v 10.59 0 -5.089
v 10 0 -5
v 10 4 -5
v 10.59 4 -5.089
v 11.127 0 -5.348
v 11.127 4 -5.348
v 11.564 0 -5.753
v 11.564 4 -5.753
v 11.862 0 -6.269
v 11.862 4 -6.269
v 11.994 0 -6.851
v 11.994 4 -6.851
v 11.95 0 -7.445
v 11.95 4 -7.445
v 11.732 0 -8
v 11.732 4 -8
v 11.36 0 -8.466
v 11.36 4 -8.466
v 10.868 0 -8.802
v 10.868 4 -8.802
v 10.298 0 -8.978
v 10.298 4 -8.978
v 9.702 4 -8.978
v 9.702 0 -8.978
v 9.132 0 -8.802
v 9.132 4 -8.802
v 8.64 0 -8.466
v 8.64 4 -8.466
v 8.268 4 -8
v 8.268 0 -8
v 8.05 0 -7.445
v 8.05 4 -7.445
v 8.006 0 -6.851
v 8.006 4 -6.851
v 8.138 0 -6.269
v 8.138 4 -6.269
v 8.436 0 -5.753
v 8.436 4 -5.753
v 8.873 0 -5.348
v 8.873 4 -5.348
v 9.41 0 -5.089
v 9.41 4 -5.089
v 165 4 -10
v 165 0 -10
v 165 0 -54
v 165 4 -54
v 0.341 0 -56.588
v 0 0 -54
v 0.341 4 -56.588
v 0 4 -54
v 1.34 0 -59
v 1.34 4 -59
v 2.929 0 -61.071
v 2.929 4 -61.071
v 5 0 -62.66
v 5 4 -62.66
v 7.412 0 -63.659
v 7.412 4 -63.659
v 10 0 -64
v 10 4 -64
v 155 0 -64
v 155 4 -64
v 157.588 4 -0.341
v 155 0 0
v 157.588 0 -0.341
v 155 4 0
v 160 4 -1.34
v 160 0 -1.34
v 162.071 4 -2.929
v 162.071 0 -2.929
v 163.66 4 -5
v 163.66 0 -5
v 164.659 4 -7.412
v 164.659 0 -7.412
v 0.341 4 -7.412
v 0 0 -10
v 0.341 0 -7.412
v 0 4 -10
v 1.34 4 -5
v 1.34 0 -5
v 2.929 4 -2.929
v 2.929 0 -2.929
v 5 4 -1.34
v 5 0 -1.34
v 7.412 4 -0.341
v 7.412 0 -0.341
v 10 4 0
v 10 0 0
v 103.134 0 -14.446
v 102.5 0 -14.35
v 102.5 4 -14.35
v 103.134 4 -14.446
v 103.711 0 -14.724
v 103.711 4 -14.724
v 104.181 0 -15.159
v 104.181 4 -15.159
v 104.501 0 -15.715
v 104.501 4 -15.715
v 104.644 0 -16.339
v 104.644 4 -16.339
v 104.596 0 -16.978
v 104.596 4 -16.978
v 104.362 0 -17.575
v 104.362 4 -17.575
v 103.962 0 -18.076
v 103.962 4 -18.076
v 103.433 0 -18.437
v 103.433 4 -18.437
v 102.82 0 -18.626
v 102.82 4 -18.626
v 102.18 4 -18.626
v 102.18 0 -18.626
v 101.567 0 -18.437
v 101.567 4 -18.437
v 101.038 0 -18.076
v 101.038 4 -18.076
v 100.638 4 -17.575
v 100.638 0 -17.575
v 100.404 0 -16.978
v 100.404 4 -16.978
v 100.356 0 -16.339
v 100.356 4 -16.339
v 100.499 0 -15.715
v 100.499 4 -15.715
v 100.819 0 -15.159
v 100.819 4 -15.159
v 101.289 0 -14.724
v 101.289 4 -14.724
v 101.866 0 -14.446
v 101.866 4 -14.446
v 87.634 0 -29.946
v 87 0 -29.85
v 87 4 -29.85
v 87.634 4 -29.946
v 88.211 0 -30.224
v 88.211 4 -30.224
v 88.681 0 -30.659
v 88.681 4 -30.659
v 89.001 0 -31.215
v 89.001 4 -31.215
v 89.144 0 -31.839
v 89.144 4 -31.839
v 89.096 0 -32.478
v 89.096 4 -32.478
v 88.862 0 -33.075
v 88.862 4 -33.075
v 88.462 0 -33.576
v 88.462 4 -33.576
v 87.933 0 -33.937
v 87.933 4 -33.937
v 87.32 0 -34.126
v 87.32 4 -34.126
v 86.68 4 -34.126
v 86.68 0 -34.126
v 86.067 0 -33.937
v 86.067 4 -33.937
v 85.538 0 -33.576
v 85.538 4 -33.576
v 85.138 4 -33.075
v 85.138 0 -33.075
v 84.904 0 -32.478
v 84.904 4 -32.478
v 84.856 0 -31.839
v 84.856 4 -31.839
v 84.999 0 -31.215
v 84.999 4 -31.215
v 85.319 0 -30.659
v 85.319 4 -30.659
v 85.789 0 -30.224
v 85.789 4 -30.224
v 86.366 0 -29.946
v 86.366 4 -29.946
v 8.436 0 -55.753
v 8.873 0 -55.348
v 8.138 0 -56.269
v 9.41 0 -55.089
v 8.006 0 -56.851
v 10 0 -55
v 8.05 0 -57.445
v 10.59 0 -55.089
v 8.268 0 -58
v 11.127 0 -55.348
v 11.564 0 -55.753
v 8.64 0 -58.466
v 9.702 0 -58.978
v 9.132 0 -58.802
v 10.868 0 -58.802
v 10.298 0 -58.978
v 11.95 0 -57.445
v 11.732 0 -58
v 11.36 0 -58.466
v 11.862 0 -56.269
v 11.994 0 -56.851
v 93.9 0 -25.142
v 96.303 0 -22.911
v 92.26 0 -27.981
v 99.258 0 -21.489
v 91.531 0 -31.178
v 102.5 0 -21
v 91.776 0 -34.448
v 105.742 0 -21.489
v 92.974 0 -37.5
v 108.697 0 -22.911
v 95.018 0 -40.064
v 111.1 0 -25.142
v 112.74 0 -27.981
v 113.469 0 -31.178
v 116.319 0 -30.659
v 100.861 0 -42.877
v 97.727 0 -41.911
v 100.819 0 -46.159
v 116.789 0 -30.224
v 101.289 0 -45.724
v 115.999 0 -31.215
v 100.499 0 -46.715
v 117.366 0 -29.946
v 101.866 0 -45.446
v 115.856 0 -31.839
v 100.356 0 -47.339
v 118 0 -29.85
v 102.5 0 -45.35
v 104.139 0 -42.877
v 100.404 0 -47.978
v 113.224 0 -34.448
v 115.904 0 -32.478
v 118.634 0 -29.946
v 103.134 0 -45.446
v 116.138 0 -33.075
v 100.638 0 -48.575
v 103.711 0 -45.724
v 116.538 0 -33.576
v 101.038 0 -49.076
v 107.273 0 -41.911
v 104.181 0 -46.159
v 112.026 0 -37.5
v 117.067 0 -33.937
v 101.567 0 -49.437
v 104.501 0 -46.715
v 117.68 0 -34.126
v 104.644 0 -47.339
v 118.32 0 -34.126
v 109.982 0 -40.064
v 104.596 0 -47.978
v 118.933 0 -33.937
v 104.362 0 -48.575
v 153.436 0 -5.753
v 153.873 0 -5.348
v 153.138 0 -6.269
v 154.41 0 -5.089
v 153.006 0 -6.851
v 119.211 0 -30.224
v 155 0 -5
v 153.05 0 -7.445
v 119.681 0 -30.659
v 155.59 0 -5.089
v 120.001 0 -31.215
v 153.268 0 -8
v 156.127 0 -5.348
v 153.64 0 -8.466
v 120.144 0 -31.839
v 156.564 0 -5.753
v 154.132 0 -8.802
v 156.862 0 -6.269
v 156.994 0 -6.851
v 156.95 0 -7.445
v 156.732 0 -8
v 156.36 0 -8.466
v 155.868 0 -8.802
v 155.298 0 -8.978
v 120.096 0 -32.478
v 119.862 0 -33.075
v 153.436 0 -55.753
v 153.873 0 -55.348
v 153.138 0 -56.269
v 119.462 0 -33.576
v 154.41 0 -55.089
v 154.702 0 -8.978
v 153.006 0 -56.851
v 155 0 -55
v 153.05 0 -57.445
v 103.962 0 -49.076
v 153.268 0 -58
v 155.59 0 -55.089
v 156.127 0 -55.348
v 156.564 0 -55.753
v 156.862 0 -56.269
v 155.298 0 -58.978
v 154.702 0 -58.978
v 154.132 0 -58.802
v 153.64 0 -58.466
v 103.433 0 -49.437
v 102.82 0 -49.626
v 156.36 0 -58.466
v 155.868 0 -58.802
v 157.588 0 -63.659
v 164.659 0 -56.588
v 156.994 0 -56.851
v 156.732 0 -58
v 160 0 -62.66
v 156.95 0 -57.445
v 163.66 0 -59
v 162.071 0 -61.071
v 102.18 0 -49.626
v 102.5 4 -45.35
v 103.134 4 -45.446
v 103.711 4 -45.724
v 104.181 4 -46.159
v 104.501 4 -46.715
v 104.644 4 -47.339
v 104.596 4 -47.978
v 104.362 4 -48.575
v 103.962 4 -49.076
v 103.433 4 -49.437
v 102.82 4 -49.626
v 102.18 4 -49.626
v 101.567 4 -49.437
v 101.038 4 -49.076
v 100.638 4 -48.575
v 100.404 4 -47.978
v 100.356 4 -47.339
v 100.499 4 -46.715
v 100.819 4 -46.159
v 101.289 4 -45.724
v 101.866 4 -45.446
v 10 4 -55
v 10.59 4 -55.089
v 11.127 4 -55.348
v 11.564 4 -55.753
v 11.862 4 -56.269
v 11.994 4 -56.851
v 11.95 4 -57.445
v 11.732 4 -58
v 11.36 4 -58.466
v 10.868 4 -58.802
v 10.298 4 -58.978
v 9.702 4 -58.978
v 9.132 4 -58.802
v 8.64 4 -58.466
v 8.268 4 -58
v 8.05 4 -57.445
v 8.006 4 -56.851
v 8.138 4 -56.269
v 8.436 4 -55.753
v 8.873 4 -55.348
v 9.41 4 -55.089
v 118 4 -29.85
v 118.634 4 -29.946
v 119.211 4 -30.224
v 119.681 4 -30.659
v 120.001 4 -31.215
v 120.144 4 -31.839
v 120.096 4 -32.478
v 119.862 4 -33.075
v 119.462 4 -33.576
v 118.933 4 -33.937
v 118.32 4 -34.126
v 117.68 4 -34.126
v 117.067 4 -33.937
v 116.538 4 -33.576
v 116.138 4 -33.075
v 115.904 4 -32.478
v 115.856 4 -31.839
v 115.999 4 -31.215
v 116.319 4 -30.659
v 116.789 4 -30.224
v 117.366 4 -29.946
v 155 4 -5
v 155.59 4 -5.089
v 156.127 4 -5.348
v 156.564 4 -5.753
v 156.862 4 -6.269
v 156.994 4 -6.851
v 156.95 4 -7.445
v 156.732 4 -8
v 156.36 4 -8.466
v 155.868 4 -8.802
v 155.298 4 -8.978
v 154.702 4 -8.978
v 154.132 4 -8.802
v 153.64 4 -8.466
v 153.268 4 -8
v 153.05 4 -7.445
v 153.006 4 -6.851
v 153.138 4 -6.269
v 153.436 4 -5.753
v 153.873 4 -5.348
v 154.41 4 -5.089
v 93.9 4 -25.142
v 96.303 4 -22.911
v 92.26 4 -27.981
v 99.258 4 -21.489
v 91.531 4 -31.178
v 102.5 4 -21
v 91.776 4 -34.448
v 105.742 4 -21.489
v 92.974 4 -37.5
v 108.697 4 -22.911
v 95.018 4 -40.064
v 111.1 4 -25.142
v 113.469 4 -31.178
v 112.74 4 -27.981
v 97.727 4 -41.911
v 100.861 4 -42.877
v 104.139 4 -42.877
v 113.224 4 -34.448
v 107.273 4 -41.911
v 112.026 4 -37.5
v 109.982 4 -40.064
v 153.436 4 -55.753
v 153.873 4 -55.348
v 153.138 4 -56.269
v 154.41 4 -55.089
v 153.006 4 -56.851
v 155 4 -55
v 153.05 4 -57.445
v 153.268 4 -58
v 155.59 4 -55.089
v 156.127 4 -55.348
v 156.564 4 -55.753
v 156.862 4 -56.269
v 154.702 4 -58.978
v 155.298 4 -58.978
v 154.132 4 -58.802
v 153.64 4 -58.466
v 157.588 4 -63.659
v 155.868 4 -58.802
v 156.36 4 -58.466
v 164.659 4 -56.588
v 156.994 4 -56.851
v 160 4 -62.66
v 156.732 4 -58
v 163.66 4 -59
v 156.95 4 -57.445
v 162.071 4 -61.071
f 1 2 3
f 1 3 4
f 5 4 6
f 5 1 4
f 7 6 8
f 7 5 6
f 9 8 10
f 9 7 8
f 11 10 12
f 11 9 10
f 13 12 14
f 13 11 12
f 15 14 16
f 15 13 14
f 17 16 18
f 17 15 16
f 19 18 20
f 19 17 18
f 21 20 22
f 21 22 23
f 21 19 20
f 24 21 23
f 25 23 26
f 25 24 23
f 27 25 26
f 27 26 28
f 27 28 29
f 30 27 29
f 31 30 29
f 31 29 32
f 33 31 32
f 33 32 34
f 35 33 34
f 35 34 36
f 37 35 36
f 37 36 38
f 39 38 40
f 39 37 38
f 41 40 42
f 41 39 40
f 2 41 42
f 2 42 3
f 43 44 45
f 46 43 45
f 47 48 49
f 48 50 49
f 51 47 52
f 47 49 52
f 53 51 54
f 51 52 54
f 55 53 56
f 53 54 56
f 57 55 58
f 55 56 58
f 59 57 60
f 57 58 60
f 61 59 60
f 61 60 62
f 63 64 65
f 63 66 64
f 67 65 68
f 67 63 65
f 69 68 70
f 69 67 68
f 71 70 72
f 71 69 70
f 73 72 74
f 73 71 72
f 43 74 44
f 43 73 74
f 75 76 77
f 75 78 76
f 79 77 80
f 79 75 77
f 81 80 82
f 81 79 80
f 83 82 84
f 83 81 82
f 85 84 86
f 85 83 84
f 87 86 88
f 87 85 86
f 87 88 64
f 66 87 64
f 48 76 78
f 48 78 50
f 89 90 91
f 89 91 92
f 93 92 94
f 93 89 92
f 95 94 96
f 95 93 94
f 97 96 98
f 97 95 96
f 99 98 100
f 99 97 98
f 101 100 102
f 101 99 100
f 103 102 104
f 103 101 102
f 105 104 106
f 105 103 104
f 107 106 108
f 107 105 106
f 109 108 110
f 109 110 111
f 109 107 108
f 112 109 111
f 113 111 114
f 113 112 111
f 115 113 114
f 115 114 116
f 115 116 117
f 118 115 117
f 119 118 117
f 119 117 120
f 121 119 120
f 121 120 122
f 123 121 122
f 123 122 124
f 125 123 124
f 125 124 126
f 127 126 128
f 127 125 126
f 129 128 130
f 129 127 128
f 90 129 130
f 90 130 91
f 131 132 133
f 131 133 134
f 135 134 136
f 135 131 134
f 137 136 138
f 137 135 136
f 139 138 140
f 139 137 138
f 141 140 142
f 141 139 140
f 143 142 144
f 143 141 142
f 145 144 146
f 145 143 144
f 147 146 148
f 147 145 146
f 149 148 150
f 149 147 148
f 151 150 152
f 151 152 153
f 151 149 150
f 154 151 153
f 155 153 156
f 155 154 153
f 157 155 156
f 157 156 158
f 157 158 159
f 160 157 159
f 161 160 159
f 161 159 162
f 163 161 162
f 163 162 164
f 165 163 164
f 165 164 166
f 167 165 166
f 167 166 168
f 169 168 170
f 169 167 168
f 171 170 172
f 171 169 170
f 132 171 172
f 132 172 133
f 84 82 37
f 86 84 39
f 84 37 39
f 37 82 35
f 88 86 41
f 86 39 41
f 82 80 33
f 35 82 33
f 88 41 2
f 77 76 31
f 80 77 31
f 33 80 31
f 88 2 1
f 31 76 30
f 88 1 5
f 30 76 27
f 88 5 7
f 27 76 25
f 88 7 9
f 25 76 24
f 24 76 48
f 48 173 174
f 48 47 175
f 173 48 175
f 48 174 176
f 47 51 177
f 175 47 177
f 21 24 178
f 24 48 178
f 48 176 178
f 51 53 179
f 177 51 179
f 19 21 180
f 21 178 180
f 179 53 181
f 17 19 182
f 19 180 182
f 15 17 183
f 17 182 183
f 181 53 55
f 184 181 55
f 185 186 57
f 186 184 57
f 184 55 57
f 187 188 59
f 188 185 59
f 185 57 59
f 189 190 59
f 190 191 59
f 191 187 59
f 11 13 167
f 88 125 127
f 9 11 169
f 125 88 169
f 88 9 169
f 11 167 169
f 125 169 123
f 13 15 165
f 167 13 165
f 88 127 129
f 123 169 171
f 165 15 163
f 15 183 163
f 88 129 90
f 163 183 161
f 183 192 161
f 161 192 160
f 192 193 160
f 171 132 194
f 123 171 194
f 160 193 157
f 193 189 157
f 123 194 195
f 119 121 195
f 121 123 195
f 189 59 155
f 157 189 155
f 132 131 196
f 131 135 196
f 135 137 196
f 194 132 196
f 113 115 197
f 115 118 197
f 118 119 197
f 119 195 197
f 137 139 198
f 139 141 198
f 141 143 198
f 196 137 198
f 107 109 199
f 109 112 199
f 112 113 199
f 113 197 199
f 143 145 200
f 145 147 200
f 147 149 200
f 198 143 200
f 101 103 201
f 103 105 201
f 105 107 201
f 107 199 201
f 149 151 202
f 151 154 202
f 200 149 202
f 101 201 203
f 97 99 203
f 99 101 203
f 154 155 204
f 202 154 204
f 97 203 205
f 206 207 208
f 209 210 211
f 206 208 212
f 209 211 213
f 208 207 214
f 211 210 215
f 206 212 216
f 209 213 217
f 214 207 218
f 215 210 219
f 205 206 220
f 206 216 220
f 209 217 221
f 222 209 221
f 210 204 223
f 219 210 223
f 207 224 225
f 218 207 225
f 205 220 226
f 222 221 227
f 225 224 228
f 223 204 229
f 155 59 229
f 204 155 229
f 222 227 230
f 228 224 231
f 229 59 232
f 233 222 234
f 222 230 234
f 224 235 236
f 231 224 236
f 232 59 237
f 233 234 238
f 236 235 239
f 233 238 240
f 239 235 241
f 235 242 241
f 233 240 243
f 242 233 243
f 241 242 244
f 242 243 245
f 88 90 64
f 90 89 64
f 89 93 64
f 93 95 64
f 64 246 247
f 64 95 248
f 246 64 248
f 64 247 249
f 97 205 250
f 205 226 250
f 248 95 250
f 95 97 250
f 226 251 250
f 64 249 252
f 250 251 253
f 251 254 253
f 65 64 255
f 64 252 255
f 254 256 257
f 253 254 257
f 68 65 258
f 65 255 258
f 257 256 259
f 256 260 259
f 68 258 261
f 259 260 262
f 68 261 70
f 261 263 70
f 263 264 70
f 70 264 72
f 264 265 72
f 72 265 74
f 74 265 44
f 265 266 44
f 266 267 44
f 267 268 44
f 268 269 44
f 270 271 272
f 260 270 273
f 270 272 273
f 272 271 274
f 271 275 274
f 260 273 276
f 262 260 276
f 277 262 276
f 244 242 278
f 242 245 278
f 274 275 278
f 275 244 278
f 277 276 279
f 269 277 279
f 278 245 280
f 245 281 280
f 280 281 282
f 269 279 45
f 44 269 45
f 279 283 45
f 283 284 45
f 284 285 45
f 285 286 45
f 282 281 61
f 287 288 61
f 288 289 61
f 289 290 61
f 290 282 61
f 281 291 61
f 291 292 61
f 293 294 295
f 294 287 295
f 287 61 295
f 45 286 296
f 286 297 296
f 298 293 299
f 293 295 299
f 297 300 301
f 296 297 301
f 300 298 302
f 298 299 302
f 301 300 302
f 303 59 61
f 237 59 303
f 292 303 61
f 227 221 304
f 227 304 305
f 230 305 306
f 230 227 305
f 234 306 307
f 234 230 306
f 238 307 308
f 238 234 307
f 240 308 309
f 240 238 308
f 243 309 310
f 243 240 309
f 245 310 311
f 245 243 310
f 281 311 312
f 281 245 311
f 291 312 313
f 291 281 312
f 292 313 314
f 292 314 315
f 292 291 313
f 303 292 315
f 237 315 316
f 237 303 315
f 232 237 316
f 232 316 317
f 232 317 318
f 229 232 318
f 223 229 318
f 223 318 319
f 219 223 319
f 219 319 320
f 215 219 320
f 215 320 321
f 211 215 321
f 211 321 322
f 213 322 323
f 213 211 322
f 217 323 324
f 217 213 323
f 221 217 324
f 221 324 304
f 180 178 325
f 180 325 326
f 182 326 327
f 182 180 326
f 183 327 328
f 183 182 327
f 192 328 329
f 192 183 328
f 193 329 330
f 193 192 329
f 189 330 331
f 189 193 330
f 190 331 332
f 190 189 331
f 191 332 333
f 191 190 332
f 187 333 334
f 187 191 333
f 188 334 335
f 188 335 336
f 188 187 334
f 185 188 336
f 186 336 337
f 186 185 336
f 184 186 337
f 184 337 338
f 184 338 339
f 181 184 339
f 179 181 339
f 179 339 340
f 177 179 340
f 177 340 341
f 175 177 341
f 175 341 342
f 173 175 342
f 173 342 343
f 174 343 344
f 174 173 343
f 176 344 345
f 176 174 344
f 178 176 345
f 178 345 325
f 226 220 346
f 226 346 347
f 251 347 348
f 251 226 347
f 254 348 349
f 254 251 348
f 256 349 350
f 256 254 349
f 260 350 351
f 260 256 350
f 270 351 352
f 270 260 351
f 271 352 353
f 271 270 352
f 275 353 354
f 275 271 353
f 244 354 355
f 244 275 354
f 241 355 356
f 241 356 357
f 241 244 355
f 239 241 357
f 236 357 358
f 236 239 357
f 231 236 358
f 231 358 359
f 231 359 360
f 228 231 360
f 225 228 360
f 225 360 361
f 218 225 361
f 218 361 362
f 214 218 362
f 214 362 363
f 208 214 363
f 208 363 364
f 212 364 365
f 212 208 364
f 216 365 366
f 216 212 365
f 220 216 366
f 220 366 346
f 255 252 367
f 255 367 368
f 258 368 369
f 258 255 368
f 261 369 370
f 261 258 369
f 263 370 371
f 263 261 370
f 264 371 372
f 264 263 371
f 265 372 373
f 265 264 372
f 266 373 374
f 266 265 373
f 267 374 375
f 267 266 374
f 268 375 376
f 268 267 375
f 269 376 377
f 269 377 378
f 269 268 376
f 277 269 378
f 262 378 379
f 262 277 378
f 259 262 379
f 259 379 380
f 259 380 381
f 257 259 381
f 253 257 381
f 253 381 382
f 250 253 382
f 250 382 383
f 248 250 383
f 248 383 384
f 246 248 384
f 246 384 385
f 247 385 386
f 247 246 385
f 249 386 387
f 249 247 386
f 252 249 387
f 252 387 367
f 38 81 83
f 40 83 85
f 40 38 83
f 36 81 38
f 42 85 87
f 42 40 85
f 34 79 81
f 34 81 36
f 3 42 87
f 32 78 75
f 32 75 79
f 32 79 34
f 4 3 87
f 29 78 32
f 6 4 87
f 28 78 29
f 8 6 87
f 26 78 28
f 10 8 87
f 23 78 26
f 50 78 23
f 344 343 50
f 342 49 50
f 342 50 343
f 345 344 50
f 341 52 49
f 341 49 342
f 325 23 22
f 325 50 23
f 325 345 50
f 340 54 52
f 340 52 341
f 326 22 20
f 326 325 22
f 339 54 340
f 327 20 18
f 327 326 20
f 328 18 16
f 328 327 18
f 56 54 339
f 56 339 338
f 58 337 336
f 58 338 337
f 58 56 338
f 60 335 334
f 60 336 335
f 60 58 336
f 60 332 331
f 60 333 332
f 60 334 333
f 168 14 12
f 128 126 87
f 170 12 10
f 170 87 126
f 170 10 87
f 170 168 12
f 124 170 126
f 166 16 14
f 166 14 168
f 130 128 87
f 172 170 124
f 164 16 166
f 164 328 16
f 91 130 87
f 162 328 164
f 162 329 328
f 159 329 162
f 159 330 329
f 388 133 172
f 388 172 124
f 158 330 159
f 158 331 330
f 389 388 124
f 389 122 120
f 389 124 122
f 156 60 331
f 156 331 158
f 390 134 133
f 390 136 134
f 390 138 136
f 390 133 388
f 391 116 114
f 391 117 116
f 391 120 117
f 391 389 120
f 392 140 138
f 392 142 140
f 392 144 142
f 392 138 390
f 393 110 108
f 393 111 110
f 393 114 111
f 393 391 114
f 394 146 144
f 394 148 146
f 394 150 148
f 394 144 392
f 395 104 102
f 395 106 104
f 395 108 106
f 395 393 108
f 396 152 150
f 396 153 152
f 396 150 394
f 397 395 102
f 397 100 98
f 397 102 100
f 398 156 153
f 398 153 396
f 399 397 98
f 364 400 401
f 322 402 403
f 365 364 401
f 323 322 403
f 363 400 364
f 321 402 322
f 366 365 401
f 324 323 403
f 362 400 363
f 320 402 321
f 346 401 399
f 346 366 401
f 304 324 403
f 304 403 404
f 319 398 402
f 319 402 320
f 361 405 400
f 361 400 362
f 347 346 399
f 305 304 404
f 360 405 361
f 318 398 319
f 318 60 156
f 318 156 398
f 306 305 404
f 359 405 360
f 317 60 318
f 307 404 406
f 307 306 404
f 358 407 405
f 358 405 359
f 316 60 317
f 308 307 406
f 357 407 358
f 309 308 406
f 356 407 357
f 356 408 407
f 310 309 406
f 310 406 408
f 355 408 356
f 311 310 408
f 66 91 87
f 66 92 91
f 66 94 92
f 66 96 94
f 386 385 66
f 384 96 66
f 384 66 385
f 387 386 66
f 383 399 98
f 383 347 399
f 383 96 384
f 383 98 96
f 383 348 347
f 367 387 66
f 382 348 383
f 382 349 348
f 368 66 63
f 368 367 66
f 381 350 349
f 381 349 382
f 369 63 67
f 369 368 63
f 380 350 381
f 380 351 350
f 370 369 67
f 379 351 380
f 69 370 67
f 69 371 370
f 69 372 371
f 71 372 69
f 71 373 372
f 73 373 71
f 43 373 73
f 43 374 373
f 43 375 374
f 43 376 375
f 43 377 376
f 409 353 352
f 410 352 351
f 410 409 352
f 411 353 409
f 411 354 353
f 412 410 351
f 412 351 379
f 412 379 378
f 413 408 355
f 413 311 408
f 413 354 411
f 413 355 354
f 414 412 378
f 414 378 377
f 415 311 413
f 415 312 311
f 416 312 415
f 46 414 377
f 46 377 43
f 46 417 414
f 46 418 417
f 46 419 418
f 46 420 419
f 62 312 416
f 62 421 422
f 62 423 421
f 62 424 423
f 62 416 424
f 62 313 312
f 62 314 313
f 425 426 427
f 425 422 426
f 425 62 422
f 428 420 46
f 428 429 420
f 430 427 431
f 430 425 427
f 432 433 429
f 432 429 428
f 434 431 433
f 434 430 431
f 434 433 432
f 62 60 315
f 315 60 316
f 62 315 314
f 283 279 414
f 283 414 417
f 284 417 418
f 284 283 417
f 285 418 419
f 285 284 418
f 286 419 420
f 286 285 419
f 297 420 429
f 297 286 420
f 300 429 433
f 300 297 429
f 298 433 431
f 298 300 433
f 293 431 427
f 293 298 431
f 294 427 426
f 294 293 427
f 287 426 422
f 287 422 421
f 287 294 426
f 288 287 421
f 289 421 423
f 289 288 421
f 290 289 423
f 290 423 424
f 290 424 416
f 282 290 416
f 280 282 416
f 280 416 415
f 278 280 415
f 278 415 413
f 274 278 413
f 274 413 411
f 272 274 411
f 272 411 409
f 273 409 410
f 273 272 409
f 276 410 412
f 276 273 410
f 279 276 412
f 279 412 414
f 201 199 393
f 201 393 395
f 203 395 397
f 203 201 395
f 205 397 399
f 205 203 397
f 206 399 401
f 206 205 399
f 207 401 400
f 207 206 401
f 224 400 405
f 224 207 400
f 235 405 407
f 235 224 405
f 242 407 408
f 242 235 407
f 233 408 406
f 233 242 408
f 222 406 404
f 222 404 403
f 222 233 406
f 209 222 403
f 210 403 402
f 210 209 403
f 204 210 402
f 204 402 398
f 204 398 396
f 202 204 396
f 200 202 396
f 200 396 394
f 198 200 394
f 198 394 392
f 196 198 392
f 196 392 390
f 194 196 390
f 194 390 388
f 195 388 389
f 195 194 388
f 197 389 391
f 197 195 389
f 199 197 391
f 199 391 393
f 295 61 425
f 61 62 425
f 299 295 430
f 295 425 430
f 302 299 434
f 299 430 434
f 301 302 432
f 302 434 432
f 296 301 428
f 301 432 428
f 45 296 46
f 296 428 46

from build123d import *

# Parameters (mm, degrees)
SKETCH_1_W      = 165
SKETCH_1_H      = 64
SKETCH_1_R      = 2
SKETCH_1_R_2    = 2.15
SKETCH_1_R_3    = 11
EXTRUDE_1_DEPTH = 4
FILLET_1_R      = 10


with BuildPart() as part:
    # 草图1 → 凸台-拉伸1 (new body)
    with BuildSketch(Plane(origin=(0, 0, 0), x_dir=(1, 0, 0), z_dir=(0, 1, 0))):
        with Locations((82.5, 32)):
            Rectangle(SKETCH_1_W, SKETCH_1_H)
        with Locations(Location((10, 57, 0), (0, 0, 270))):
            Circle(SKETCH_1_R, mode=Mode.SUBTRACT)
        with Locations(Location((155, 57, 0), (0, 0, 270))):
            Circle(SKETCH_1_R, mode=Mode.SUBTRACT)
        with Locations(Location((155, 7, 0), (0, 0, 270))):
            Circle(SKETCH_1_R, mode=Mode.SUBTRACT)
        with Locations(Location((10, 7, 0), (0, 0, 270))):
            Circle(SKETCH_1_R, mode=Mode.SUBTRACT)
        with Locations(Location((102.5, 47.5, 0), (0, 0, 270))):
            Circle(SKETCH_1_R_2, mode=Mode.SUBTRACT)
        with Locations(Location((87, 32, 0), (0, 0, 270))):
            Circle(SKETCH_1_R_2, mode=Mode.SUBTRACT)
        with Locations(Location((102.5, 16.5, 0), (0, 0, 270))):
            Circle(SKETCH_1_R_2, mode=Mode.SUBTRACT)
        with Locations(Location((118, 32, 0), (0, 0, 270))):
            Circle(SKETCH_1_R_2, mode=Mode.SUBTRACT)
        with Locations(Location((102.5, 32, 0), (0, 0, 270))):
            Circle(SKETCH_1_R_3, mode=Mode.SUBTRACT)
    extrude(amount=EXTRUDE_1_DEPTH)

    # 圆角1
    fillet_1_edges = [part.edges().sort_by_distance(p)[0] for p in [
        (0, 2, -64),
        (165, 2, -64),
        (165, 2, 0),
        (0, 2, 0),
    ]]
    fillet(fillet_1_edges, radius=FILLET_1_R)


solid = part.part
